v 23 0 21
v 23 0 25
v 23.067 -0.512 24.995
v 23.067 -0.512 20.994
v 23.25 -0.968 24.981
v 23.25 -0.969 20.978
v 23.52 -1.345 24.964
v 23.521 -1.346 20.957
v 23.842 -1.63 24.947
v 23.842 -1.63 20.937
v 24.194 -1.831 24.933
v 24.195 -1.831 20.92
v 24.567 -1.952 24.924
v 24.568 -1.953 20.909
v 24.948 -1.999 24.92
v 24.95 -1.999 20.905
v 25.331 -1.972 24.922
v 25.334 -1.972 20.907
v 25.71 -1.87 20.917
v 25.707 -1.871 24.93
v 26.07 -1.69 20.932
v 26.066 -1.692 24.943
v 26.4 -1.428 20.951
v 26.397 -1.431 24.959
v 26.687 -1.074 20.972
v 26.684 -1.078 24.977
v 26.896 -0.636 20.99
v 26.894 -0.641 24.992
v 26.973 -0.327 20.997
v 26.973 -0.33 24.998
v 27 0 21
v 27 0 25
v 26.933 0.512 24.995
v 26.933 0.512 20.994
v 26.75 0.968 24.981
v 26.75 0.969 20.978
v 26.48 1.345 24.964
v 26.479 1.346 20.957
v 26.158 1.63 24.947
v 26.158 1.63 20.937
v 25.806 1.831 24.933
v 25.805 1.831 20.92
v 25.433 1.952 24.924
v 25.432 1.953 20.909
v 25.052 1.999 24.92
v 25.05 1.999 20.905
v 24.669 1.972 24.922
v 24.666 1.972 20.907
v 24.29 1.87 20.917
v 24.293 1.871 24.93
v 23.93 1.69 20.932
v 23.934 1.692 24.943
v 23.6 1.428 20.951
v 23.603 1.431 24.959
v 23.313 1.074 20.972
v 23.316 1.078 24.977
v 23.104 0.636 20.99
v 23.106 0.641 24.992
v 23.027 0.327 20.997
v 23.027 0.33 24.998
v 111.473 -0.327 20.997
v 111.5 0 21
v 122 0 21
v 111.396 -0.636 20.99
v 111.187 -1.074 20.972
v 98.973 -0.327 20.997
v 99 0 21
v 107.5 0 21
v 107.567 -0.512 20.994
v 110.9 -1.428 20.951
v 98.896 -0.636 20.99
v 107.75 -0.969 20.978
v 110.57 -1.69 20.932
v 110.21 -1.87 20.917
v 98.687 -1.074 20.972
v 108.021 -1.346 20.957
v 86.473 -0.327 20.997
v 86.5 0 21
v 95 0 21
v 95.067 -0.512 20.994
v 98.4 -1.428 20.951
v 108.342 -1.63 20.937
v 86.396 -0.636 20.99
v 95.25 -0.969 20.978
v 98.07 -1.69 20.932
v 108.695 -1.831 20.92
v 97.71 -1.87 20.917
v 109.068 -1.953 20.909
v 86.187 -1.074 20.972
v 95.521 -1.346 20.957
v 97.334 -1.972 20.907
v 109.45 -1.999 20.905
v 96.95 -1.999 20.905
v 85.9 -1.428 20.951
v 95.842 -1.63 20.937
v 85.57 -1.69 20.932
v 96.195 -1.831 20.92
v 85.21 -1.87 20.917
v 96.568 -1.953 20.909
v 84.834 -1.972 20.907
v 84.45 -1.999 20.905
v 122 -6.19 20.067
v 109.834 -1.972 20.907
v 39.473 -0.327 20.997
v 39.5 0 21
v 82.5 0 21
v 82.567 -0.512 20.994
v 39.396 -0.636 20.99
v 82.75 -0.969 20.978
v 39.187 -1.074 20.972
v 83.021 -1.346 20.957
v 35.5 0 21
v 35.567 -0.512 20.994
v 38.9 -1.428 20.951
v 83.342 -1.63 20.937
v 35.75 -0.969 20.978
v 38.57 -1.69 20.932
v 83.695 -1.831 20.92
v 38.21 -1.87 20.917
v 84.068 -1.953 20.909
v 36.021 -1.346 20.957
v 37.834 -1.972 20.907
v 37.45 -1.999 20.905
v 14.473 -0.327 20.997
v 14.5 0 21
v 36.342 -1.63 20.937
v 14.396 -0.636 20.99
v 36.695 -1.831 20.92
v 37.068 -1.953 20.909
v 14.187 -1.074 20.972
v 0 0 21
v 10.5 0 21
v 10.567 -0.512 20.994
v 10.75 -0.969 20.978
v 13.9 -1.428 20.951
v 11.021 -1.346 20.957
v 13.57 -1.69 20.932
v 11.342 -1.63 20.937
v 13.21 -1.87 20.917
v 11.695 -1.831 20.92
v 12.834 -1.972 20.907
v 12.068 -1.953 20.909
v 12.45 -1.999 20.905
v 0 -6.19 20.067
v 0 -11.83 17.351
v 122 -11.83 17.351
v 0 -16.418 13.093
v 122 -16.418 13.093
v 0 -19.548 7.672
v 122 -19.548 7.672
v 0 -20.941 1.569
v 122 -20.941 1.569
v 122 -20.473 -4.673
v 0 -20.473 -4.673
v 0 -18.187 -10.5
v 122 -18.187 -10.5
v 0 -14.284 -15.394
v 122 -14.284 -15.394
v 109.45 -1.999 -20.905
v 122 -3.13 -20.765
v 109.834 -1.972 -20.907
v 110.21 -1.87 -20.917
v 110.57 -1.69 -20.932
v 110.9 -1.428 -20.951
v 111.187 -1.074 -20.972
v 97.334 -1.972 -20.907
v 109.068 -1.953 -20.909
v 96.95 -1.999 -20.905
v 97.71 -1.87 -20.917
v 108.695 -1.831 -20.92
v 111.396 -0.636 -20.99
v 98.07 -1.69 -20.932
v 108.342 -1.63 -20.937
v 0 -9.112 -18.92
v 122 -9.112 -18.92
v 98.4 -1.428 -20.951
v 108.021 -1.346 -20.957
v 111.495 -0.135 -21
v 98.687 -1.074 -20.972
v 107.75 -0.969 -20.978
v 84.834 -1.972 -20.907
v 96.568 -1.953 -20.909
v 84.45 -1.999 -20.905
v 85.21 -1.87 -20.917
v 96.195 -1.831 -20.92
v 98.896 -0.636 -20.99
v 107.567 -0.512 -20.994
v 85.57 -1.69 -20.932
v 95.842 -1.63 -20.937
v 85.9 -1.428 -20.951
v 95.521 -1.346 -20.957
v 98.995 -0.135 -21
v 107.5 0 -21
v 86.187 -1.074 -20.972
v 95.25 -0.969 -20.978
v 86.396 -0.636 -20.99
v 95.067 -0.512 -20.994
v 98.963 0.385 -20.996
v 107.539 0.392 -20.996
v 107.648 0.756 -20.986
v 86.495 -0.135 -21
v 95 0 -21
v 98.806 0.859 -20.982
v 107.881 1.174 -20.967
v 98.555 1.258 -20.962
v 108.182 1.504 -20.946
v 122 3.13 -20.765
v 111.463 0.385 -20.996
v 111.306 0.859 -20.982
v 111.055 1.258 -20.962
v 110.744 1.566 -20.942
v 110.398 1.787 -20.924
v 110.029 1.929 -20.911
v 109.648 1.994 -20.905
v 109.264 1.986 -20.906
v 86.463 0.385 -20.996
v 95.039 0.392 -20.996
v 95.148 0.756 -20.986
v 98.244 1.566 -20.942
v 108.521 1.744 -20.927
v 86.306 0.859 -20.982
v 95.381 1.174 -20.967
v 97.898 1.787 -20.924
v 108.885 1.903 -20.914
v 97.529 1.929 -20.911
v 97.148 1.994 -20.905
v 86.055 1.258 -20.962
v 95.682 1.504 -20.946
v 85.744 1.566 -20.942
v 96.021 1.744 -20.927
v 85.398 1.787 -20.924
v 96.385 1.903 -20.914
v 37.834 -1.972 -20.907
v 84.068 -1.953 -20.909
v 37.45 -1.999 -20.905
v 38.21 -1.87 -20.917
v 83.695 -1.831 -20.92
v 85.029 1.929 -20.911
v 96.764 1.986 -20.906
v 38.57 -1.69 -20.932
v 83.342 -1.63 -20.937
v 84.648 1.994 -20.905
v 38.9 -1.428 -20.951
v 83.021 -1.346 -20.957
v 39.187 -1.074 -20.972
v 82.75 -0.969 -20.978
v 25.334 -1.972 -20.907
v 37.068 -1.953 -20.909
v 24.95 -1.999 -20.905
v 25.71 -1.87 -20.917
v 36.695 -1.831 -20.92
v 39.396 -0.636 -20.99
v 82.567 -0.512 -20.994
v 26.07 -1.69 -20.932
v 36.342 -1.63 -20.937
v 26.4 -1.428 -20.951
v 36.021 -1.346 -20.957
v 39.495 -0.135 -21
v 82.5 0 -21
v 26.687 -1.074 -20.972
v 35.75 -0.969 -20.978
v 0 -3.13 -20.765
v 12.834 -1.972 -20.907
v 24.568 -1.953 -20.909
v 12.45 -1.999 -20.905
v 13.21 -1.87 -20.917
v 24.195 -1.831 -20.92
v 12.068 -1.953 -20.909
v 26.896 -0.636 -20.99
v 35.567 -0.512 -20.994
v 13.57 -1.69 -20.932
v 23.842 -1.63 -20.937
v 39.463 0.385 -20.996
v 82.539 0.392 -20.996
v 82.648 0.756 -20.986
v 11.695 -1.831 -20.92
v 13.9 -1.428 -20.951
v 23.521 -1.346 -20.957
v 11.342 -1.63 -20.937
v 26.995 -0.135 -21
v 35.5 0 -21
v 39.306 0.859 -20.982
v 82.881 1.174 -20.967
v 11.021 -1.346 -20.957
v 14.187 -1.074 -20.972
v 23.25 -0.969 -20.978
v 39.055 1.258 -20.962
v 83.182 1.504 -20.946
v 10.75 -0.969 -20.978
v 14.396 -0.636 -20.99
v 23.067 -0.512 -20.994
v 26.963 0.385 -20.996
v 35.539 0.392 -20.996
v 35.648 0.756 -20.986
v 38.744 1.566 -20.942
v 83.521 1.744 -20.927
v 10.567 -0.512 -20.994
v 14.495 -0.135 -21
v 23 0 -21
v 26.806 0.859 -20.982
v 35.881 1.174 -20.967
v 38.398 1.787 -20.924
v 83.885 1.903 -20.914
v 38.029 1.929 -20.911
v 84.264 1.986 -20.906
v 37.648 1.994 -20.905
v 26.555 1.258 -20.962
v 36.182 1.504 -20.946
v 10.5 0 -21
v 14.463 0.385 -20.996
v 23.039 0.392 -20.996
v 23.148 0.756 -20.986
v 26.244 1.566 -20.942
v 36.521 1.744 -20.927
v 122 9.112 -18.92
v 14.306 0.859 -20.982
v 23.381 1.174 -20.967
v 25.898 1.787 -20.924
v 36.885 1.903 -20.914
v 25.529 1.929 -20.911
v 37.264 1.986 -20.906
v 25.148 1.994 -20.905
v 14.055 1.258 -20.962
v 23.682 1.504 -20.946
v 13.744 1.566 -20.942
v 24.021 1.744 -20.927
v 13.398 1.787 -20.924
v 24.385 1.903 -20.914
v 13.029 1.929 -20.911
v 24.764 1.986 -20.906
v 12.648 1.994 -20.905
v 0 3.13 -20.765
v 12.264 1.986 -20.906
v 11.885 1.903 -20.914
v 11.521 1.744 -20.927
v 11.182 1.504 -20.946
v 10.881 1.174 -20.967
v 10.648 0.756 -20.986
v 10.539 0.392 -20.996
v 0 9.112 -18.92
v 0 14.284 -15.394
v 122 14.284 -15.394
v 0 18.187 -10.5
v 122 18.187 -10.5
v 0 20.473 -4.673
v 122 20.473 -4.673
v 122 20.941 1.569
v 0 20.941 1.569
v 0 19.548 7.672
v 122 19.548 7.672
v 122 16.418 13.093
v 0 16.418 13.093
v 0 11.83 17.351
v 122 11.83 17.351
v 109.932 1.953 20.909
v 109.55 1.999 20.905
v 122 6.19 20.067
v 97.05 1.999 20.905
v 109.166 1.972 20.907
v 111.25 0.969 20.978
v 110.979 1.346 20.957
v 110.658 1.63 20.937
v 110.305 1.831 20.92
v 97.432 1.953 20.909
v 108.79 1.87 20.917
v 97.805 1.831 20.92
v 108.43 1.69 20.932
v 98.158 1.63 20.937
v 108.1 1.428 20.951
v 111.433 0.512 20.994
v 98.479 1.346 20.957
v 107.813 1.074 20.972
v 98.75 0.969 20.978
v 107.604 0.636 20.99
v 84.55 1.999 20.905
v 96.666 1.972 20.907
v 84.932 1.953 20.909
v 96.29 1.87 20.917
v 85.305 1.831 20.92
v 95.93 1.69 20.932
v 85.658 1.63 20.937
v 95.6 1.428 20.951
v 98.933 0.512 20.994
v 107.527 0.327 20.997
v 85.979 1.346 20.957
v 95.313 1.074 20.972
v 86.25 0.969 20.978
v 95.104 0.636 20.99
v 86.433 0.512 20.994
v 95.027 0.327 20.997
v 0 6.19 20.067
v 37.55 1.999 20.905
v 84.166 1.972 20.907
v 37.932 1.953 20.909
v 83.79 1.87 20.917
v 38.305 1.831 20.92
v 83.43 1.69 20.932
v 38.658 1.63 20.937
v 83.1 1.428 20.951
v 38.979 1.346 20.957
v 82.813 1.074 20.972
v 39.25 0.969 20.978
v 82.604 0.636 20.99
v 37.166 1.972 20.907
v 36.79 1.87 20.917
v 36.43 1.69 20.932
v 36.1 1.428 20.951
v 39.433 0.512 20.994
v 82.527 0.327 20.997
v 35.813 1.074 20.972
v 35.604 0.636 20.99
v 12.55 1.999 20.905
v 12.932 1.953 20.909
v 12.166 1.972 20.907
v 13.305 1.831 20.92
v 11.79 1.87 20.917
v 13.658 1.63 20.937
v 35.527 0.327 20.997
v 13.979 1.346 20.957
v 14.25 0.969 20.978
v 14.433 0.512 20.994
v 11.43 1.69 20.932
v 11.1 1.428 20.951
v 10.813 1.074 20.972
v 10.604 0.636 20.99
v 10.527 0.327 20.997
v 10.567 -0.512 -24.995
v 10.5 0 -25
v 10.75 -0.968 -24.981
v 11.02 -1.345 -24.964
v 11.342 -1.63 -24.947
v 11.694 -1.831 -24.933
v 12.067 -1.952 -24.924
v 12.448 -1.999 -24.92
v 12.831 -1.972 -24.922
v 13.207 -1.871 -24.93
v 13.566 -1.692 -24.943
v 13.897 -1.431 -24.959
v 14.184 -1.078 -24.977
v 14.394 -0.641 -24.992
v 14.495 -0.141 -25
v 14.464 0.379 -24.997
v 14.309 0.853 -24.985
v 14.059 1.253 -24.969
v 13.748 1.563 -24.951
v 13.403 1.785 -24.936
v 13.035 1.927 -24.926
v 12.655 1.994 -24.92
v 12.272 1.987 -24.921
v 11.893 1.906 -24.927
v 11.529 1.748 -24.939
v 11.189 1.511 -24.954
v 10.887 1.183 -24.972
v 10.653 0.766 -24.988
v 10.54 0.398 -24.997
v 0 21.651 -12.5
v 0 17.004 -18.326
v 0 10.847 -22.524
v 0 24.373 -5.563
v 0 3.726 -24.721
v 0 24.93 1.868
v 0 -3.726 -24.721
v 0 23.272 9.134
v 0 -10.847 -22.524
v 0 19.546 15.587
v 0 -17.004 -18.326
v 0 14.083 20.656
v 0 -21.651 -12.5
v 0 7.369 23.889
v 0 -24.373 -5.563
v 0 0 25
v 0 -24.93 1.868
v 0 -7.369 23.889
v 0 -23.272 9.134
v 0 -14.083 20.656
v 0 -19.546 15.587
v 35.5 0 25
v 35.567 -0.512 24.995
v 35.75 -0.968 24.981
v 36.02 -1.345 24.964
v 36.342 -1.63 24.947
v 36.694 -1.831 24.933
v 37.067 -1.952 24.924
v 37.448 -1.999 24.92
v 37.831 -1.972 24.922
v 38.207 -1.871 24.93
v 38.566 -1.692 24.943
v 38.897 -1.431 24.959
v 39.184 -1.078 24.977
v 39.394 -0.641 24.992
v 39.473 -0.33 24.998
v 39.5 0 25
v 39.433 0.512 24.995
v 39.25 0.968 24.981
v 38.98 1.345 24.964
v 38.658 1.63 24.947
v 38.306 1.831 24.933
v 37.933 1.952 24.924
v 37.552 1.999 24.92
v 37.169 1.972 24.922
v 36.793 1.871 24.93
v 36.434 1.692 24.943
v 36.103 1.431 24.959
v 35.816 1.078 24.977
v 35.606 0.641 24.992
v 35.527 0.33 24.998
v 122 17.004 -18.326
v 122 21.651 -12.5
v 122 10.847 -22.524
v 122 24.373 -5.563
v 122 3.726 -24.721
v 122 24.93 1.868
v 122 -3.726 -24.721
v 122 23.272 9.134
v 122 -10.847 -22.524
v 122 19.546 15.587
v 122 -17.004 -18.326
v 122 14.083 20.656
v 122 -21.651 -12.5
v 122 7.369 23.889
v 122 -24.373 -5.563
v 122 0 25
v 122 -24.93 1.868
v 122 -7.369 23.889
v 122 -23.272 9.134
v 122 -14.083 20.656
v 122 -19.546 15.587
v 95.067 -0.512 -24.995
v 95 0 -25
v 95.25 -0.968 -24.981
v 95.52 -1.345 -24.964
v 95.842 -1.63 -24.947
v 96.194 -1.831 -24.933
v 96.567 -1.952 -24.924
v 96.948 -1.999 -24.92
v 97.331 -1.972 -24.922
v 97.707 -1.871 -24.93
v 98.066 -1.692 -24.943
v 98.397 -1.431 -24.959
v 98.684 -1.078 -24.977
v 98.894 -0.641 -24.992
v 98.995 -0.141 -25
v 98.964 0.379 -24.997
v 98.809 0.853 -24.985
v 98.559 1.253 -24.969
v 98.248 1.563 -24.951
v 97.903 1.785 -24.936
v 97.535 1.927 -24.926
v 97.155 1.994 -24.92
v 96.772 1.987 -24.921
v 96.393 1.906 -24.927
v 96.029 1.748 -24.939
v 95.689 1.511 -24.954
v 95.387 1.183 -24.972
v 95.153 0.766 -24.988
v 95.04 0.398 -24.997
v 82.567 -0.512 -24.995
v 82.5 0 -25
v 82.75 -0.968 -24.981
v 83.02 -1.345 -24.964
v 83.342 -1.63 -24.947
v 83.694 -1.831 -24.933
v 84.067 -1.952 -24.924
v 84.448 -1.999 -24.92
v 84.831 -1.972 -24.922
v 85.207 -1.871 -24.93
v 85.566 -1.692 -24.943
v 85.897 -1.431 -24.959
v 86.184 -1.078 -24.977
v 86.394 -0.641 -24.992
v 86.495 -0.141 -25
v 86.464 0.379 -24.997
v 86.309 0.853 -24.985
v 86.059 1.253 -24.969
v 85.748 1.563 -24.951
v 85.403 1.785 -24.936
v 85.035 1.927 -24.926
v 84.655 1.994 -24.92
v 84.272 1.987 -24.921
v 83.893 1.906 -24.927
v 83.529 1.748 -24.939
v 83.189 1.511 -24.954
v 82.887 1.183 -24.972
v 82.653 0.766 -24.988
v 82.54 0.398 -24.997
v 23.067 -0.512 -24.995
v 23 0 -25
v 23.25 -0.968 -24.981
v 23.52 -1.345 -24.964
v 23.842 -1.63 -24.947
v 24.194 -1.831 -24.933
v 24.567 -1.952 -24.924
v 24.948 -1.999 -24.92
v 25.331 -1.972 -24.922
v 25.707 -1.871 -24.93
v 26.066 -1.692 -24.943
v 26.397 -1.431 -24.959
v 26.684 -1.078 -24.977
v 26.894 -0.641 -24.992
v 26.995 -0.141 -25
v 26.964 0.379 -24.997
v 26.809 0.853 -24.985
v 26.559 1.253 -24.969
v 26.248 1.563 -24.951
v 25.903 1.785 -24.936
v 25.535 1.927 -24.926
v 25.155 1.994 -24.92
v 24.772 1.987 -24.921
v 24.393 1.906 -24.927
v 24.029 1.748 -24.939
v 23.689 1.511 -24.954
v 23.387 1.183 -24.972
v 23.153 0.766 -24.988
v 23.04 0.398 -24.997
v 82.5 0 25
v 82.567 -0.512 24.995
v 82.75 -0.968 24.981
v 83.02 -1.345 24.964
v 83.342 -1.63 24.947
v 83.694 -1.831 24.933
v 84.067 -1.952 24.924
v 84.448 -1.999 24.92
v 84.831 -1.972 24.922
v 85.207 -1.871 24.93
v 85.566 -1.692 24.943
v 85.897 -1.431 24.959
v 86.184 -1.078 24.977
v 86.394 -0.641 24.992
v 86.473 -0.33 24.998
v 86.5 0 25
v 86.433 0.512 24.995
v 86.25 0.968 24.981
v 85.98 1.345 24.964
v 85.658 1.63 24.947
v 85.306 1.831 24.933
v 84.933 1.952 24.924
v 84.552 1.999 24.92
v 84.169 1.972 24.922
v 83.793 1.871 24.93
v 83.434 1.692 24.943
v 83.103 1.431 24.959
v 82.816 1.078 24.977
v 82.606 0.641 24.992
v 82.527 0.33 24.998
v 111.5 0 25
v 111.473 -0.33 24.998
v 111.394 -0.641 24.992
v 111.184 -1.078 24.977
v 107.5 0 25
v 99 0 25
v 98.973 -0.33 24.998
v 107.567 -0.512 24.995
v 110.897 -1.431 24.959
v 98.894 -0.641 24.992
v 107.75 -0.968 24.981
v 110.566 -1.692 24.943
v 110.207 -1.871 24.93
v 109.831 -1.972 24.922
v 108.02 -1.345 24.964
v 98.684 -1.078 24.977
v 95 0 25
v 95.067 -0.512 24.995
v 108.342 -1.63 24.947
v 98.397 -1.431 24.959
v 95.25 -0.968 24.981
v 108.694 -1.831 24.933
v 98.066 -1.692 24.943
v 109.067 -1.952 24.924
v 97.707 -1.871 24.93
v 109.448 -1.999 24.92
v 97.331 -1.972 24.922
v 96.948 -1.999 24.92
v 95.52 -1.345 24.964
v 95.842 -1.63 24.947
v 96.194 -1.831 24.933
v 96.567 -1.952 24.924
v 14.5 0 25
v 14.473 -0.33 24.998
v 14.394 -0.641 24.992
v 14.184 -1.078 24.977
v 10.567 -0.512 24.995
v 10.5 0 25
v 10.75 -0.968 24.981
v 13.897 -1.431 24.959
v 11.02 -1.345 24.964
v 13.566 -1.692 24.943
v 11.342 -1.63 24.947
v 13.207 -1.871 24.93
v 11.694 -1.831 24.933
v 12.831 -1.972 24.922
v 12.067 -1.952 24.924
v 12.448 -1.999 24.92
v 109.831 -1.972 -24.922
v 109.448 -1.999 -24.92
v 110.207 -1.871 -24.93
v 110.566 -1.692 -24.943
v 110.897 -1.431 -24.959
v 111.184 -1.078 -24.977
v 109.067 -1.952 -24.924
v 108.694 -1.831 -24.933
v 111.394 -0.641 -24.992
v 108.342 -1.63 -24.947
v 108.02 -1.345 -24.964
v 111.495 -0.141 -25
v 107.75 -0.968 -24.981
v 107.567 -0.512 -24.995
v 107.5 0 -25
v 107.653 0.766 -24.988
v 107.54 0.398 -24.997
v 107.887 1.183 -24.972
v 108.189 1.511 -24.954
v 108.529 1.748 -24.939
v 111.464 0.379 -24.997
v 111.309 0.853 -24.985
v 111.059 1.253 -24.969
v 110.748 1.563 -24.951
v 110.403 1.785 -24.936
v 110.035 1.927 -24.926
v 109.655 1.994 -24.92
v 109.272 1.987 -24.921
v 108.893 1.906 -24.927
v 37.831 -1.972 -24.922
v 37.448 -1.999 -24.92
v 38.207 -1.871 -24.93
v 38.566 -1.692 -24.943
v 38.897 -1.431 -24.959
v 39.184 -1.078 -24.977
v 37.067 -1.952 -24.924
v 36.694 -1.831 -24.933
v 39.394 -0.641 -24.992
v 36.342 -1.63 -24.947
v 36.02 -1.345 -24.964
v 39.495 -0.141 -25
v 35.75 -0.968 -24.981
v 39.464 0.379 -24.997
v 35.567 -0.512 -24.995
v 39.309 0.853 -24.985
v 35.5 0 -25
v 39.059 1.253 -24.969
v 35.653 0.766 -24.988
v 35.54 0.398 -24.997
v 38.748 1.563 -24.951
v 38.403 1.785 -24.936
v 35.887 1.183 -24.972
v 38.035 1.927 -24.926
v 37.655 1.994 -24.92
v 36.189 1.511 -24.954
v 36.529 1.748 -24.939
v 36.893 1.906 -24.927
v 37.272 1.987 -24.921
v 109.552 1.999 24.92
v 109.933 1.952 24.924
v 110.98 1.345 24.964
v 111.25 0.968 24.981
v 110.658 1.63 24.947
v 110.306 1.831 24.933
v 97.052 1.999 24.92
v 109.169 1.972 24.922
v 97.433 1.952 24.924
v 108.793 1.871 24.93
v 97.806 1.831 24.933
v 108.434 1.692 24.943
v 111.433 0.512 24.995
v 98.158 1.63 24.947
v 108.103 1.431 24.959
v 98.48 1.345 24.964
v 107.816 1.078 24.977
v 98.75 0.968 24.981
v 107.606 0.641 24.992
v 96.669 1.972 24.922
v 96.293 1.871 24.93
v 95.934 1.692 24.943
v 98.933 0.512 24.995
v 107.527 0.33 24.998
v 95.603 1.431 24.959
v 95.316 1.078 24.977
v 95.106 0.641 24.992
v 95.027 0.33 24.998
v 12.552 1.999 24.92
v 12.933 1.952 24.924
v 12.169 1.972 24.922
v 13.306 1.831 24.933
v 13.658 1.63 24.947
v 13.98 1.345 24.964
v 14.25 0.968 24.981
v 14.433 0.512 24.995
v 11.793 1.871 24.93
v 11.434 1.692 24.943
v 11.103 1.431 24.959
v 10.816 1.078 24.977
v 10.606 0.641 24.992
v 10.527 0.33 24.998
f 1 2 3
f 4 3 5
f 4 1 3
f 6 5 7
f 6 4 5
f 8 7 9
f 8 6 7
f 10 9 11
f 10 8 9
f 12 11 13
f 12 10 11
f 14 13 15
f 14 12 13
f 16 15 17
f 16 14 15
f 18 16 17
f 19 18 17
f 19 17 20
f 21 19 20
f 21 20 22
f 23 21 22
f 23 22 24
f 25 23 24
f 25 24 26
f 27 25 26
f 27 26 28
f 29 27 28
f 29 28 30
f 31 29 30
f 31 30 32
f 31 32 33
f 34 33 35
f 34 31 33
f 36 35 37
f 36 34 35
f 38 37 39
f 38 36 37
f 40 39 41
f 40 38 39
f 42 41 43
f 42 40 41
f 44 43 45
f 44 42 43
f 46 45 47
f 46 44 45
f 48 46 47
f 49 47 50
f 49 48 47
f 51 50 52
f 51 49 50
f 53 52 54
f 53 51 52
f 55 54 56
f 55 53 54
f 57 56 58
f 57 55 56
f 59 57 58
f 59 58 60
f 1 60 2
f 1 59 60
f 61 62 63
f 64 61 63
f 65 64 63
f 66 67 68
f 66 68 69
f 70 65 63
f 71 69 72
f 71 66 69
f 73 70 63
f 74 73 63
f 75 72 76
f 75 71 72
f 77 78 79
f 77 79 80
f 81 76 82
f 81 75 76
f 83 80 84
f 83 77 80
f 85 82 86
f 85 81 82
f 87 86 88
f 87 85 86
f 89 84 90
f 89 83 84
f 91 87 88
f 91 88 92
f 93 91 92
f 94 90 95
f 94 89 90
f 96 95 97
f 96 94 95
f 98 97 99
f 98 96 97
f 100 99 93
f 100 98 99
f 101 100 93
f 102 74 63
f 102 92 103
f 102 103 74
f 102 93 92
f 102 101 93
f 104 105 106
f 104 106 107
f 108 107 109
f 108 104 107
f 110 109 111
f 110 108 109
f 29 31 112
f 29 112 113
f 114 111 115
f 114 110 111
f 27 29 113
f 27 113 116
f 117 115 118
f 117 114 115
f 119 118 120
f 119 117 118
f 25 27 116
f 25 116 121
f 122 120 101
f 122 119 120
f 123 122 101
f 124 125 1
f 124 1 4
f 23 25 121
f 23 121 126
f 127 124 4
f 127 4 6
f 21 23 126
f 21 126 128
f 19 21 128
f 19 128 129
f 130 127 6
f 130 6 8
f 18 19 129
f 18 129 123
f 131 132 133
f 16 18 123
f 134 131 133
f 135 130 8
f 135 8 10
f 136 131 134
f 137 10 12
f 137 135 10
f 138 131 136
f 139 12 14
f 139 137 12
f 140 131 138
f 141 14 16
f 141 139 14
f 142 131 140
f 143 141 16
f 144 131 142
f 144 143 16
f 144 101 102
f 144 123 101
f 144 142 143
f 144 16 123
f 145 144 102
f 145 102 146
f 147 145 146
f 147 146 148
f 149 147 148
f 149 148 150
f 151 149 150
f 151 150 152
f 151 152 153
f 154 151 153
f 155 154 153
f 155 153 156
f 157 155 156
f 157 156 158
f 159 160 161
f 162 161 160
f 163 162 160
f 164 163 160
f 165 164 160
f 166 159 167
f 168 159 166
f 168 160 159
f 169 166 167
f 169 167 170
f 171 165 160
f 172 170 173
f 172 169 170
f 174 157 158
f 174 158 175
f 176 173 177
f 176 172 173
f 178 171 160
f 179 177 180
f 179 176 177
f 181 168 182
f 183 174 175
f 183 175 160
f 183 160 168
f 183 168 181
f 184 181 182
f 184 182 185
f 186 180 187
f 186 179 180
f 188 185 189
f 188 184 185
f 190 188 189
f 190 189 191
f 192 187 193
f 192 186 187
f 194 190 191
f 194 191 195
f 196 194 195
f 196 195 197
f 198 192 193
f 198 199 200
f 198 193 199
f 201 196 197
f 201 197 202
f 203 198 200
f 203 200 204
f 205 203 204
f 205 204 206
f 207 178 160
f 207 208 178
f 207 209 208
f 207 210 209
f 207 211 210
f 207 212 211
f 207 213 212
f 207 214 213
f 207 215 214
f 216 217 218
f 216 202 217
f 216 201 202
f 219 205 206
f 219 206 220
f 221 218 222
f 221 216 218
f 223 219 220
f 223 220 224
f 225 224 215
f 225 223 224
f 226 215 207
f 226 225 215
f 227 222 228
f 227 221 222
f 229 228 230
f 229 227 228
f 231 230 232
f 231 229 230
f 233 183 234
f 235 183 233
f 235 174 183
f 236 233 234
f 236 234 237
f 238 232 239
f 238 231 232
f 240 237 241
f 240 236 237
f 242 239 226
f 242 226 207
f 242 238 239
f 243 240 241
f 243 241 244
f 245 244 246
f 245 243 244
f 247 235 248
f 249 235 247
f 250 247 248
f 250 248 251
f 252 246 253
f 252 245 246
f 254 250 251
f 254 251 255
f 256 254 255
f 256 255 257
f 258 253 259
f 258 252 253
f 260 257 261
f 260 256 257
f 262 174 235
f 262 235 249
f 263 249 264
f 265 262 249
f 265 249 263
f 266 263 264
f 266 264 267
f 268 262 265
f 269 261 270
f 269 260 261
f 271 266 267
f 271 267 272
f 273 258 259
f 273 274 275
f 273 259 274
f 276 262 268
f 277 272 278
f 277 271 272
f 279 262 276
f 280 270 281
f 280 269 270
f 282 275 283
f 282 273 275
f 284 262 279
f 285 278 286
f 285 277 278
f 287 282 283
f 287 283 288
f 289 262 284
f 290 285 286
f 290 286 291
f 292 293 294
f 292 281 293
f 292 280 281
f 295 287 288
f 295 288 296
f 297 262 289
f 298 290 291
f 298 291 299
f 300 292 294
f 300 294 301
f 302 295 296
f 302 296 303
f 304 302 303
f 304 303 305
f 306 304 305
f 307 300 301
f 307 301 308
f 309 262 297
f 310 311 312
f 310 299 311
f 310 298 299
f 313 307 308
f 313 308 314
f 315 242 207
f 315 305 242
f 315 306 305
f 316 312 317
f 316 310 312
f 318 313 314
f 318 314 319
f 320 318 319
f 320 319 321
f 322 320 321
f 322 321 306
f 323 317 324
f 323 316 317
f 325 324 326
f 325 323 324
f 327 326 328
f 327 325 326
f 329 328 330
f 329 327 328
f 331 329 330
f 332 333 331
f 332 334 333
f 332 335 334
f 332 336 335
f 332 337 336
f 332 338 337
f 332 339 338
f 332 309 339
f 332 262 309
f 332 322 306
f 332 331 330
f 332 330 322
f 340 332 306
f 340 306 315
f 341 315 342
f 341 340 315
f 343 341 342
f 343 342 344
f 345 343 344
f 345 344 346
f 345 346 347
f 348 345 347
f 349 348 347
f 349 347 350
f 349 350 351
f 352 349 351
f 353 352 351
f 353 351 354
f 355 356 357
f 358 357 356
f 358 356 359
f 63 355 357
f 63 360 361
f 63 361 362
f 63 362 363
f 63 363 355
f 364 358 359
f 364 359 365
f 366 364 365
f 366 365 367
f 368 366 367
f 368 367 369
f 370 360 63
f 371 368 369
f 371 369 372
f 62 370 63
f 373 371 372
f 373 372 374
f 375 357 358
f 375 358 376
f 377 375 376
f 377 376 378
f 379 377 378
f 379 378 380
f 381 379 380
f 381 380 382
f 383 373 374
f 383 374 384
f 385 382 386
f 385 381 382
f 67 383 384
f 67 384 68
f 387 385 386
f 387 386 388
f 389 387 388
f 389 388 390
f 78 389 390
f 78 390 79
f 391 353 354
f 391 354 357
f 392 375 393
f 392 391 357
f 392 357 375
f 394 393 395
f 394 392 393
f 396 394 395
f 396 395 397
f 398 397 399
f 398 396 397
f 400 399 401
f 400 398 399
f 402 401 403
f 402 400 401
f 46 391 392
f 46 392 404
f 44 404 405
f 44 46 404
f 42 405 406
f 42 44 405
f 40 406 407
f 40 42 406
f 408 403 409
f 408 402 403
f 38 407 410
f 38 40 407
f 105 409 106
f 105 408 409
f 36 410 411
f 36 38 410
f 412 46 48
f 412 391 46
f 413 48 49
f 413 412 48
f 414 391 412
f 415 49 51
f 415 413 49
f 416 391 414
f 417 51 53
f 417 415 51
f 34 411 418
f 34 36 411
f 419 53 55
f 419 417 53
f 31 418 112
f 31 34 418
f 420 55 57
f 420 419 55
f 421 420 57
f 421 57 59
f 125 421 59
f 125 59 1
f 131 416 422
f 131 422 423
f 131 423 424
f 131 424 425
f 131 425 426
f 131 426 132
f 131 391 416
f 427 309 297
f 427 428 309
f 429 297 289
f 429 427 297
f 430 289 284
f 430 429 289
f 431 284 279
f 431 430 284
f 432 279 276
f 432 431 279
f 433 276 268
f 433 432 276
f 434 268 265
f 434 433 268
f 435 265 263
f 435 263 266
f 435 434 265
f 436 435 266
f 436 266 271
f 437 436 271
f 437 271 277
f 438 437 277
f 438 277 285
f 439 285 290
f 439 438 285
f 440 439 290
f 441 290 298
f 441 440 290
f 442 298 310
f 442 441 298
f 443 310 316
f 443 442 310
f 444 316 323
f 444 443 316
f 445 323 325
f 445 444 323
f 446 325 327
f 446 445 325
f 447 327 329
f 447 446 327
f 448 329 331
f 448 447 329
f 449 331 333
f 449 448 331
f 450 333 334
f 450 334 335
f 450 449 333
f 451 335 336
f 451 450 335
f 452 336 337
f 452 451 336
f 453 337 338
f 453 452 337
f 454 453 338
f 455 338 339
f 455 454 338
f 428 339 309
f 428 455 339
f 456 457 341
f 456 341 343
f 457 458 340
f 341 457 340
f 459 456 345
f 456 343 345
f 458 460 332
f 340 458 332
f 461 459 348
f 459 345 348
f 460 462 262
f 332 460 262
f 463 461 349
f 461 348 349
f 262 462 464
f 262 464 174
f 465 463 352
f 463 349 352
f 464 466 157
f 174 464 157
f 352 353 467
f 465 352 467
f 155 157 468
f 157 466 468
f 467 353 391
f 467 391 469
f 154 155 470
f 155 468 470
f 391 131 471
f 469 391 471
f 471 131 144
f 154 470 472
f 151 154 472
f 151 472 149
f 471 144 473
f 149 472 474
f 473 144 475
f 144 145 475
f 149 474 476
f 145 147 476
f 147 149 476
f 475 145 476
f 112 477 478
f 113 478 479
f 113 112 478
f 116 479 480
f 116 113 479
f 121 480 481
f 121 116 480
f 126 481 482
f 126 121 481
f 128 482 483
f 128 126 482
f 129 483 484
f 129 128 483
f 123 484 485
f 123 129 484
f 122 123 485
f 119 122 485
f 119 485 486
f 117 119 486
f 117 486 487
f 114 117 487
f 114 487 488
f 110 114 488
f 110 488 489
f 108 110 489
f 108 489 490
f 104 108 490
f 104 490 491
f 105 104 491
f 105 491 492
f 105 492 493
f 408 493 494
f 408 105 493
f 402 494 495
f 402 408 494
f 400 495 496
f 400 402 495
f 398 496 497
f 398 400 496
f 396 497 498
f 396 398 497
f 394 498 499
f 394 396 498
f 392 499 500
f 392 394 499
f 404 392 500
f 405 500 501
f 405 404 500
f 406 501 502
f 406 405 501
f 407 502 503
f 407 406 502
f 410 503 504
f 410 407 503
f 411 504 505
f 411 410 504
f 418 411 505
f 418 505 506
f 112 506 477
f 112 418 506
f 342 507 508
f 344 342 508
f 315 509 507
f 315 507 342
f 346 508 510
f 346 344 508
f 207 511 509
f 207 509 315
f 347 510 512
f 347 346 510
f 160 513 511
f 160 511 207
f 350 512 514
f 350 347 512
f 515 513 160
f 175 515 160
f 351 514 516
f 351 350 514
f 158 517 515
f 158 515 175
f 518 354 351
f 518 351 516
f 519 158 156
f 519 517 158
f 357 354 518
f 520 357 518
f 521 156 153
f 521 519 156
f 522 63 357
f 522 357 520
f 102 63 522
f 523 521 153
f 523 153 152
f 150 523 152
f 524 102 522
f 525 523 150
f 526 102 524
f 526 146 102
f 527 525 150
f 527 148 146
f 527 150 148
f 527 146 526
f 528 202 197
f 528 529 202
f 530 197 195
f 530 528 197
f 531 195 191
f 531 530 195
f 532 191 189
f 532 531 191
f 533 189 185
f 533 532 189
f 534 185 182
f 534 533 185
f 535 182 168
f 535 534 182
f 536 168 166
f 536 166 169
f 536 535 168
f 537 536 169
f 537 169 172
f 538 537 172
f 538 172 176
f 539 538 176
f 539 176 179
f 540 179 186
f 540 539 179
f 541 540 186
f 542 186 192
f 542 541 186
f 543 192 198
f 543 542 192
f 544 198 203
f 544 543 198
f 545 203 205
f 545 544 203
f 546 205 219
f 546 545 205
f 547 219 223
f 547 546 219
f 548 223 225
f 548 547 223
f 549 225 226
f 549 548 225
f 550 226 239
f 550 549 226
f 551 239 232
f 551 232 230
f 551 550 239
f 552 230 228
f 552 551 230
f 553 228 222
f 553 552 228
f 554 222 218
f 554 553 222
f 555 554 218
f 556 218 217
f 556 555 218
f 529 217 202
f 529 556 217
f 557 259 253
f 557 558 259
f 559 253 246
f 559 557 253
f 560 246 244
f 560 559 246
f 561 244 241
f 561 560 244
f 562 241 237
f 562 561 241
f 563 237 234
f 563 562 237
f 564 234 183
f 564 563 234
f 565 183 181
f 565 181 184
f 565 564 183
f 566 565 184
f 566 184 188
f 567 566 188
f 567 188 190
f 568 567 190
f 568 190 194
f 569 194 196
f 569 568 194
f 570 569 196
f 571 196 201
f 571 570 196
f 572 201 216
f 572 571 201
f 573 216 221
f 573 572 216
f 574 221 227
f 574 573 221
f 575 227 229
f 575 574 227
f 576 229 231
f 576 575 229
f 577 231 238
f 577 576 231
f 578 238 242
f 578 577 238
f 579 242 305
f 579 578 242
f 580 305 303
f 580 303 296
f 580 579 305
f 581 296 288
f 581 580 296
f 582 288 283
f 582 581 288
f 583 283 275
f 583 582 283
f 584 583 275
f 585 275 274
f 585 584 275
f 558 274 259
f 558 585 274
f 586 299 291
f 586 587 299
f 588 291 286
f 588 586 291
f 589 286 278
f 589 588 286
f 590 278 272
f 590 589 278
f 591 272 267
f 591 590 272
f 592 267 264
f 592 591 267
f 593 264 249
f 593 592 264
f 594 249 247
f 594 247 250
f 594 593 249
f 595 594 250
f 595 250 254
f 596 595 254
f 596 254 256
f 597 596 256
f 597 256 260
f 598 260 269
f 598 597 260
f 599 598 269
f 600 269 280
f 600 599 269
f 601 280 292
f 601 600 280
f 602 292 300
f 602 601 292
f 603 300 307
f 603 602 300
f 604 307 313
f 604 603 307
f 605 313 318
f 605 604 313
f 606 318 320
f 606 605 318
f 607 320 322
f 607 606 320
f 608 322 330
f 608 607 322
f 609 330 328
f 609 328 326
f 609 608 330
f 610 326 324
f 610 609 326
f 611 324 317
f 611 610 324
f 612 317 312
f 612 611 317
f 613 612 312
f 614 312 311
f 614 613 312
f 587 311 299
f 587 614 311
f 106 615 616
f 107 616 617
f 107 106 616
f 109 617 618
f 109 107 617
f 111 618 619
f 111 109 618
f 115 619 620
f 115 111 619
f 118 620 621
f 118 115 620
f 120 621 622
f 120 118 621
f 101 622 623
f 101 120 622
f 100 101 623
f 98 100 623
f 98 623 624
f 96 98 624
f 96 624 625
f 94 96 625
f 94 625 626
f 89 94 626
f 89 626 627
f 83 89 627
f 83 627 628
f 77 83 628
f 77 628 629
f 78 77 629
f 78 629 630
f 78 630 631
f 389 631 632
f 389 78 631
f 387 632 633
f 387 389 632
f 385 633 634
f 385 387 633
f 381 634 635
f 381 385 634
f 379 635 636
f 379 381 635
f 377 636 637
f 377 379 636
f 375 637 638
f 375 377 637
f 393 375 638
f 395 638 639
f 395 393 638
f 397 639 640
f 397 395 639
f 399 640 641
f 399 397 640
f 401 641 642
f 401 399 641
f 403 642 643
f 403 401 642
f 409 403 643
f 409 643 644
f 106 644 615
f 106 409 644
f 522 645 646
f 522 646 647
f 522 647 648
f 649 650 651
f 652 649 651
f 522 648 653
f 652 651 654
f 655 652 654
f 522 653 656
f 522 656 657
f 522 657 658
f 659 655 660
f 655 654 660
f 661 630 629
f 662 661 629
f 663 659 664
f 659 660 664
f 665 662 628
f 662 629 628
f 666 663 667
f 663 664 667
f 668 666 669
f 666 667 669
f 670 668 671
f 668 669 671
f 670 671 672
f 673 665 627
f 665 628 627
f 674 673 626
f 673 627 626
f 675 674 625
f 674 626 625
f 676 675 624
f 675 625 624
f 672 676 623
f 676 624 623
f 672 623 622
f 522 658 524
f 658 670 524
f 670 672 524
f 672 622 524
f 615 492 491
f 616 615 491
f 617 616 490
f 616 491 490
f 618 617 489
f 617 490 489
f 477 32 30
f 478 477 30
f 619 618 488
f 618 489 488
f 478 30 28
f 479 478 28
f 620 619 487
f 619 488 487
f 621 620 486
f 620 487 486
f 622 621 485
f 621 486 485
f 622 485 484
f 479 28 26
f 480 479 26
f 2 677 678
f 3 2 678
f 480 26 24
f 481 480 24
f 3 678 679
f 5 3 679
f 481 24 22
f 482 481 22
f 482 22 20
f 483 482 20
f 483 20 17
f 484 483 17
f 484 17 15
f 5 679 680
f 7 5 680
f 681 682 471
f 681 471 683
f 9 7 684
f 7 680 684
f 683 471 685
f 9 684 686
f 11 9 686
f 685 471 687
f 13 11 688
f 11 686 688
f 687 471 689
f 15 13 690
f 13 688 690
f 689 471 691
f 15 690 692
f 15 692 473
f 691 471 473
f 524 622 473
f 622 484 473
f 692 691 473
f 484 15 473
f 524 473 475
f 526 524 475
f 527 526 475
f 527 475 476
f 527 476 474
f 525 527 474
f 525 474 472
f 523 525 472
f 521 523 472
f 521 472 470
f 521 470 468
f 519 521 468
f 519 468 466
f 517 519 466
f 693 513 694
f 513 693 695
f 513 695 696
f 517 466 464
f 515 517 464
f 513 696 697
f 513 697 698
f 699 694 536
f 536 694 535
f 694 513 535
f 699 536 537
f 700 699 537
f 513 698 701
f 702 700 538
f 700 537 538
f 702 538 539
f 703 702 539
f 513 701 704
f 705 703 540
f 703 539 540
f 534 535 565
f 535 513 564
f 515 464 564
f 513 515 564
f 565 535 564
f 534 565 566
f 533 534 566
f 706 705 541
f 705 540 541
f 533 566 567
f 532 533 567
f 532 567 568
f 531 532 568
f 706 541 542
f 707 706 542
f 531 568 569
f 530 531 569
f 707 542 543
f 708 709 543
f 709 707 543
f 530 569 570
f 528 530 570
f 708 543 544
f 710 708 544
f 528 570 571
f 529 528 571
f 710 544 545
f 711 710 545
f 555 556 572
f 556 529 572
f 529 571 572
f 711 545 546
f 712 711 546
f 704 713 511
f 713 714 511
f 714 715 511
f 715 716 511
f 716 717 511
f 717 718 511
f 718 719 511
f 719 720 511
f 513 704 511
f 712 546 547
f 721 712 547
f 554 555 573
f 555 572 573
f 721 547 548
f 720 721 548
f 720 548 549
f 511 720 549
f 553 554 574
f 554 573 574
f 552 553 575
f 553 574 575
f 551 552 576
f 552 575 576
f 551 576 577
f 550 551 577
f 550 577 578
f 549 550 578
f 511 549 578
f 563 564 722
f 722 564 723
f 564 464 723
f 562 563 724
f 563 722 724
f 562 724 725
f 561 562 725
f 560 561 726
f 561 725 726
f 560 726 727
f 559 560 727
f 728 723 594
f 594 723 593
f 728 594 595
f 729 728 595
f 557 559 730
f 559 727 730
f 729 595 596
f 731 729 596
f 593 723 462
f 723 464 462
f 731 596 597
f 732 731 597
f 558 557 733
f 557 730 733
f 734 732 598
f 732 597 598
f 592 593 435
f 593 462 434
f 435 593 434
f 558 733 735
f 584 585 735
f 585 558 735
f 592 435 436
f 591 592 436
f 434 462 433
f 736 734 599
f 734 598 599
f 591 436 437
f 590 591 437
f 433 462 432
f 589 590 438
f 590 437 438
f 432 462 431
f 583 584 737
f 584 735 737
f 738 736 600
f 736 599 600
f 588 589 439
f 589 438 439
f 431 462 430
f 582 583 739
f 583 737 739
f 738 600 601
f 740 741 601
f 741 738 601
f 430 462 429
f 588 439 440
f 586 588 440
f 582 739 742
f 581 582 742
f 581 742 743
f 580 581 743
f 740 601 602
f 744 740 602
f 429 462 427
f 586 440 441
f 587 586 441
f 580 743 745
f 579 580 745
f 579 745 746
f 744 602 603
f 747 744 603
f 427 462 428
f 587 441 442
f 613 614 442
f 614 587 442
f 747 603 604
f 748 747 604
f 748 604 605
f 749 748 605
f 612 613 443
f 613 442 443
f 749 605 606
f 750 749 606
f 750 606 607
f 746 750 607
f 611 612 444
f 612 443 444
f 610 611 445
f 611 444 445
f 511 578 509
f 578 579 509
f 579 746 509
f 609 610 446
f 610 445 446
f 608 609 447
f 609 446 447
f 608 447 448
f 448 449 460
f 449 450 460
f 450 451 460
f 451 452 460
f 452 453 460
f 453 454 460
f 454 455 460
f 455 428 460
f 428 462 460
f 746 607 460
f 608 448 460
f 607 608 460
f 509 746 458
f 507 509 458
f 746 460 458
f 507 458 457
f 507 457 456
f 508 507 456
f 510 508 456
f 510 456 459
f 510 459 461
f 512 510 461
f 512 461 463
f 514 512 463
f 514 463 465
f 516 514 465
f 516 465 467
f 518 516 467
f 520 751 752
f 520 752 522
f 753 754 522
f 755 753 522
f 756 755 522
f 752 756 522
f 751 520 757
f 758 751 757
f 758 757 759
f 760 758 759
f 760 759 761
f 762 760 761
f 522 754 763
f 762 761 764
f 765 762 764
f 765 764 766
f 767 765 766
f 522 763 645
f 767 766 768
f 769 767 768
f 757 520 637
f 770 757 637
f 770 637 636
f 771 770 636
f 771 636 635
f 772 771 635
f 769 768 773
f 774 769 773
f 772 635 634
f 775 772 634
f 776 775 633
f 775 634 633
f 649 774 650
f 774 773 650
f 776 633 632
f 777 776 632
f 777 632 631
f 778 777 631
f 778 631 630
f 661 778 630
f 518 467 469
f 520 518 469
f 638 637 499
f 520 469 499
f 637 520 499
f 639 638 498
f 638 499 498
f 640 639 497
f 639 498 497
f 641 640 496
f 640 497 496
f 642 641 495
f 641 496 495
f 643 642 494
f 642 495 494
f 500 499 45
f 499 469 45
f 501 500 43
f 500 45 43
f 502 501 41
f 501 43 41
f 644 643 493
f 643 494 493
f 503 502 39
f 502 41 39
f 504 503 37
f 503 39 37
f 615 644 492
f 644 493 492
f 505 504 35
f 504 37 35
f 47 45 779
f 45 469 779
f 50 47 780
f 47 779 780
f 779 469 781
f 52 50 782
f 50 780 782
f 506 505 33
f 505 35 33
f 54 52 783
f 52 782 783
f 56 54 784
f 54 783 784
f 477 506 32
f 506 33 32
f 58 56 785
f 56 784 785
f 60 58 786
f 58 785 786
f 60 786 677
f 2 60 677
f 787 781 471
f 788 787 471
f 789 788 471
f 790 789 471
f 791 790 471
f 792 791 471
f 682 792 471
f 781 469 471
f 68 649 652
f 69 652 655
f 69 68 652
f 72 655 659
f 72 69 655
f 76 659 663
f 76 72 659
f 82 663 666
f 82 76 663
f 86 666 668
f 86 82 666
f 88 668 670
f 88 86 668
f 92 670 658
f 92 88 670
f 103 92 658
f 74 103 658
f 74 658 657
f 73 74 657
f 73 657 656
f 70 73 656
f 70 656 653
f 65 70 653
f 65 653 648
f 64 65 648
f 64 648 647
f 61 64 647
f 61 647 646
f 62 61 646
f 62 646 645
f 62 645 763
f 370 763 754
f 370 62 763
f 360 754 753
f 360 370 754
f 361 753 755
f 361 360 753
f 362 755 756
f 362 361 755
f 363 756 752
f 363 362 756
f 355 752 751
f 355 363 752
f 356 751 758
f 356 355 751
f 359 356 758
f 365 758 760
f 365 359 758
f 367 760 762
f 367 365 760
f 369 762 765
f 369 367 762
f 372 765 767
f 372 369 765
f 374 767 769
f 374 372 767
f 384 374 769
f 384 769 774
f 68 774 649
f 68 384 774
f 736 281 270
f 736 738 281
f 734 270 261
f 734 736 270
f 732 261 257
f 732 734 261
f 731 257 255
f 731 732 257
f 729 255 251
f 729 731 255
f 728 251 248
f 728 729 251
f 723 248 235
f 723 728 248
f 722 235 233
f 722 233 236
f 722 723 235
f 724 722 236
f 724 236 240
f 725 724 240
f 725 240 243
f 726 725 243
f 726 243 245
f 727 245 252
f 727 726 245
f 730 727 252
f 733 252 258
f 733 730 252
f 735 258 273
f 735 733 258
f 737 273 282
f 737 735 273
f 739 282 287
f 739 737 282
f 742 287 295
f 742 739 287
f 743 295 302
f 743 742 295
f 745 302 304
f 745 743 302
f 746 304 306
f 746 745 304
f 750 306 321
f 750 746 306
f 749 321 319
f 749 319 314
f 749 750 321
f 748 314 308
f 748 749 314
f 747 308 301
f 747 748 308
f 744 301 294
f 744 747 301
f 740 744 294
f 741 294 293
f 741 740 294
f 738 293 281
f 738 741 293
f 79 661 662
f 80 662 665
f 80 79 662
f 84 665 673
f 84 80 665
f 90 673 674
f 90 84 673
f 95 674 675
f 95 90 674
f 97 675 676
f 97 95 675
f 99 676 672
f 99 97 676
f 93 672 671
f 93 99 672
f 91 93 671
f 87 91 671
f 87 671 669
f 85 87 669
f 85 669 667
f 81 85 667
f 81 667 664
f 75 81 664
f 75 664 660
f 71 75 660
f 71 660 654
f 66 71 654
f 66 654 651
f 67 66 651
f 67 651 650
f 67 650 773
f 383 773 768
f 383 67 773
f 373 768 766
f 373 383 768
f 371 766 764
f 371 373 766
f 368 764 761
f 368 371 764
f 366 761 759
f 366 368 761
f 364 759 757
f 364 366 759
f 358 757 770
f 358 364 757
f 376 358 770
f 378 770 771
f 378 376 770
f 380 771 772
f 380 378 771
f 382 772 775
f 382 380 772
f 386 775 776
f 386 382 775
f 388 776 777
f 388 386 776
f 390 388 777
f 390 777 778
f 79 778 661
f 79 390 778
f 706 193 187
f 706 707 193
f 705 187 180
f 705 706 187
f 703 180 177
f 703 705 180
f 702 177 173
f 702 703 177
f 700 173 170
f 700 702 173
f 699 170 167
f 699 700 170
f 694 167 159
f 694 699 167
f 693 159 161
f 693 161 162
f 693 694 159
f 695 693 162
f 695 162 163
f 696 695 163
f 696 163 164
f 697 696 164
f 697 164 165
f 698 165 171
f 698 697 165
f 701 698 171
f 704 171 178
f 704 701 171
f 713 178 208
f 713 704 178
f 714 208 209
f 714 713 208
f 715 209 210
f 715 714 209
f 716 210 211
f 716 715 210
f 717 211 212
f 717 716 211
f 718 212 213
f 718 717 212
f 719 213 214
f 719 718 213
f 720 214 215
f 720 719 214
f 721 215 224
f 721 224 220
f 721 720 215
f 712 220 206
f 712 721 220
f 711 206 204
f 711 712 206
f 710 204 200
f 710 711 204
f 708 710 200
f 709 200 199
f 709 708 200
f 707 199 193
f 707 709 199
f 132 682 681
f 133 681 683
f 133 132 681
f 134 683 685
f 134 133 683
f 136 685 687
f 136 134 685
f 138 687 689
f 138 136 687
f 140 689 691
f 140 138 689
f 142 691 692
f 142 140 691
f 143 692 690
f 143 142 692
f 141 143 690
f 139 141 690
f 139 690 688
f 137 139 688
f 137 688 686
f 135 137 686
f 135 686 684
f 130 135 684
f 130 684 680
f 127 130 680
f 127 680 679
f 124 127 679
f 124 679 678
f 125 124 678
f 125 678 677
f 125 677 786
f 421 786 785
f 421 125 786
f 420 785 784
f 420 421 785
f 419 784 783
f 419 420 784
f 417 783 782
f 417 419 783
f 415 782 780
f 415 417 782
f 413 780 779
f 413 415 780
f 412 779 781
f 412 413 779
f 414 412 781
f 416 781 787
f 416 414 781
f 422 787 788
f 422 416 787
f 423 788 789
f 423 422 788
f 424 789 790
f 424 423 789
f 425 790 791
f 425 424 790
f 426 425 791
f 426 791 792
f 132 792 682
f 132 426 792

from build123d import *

# Parameters (mm, degrees)
SKETCH_2_R               = 25
SKETCH_2_R_2             = 21
EXTRUDE_2_DEPTH          = 122
CUT_EXTRUDE_2_DEPTH      = 10
CUT_EXTRUDE_2_DEPTH_BACK = 135.197615478
SKETCH_4_R               = 2


with BuildPart() as part:
    # Эскиз2 → Бобышка-Вытянуть2 (new body)
    with BuildSketch(Plane(origin=(0, 0, 0), x_dir=(0, 0, -1), z_dir=(1, 0, 0))):
        Circle(SKETCH_2_R)
        Circle(SKETCH_2_R_2, mode=Mode.SUBTRACT)
    extrude(amount=EXTRUDE_2_DEPTH)

    # Эскиз4 → Вырез-Вытянуть2 (cut, two sides: drawn at the far end of the back side and taken through both)
    with BuildSketch(Plane.XY.offset(25).offset(-CUT_EXTRUDE_2_DEPTH_BACK)):
        with Locations((12.5, 0)):
            Circle(SKETCH_4_R)
        with Locations((109.5, 0)):
            Circle(SKETCH_4_R)
        with Locations((25, 0)):
            Circle(SKETCH_4_R)
        with Locations((37.5, 0)):
            Circle(SKETCH_4_R)
        with Locations((97, 0)):
            Circle(SKETCH_4_R)
        with Locations((84.5, 0)):
            Circle(SKETCH_4_R)
    extrude(amount=CUT_EXTRUDE_2_DEPTH + CUT_EXTRUDE_2_DEPTH_BACK, mode=Mode.SUBTRACT)


solid = part.part
